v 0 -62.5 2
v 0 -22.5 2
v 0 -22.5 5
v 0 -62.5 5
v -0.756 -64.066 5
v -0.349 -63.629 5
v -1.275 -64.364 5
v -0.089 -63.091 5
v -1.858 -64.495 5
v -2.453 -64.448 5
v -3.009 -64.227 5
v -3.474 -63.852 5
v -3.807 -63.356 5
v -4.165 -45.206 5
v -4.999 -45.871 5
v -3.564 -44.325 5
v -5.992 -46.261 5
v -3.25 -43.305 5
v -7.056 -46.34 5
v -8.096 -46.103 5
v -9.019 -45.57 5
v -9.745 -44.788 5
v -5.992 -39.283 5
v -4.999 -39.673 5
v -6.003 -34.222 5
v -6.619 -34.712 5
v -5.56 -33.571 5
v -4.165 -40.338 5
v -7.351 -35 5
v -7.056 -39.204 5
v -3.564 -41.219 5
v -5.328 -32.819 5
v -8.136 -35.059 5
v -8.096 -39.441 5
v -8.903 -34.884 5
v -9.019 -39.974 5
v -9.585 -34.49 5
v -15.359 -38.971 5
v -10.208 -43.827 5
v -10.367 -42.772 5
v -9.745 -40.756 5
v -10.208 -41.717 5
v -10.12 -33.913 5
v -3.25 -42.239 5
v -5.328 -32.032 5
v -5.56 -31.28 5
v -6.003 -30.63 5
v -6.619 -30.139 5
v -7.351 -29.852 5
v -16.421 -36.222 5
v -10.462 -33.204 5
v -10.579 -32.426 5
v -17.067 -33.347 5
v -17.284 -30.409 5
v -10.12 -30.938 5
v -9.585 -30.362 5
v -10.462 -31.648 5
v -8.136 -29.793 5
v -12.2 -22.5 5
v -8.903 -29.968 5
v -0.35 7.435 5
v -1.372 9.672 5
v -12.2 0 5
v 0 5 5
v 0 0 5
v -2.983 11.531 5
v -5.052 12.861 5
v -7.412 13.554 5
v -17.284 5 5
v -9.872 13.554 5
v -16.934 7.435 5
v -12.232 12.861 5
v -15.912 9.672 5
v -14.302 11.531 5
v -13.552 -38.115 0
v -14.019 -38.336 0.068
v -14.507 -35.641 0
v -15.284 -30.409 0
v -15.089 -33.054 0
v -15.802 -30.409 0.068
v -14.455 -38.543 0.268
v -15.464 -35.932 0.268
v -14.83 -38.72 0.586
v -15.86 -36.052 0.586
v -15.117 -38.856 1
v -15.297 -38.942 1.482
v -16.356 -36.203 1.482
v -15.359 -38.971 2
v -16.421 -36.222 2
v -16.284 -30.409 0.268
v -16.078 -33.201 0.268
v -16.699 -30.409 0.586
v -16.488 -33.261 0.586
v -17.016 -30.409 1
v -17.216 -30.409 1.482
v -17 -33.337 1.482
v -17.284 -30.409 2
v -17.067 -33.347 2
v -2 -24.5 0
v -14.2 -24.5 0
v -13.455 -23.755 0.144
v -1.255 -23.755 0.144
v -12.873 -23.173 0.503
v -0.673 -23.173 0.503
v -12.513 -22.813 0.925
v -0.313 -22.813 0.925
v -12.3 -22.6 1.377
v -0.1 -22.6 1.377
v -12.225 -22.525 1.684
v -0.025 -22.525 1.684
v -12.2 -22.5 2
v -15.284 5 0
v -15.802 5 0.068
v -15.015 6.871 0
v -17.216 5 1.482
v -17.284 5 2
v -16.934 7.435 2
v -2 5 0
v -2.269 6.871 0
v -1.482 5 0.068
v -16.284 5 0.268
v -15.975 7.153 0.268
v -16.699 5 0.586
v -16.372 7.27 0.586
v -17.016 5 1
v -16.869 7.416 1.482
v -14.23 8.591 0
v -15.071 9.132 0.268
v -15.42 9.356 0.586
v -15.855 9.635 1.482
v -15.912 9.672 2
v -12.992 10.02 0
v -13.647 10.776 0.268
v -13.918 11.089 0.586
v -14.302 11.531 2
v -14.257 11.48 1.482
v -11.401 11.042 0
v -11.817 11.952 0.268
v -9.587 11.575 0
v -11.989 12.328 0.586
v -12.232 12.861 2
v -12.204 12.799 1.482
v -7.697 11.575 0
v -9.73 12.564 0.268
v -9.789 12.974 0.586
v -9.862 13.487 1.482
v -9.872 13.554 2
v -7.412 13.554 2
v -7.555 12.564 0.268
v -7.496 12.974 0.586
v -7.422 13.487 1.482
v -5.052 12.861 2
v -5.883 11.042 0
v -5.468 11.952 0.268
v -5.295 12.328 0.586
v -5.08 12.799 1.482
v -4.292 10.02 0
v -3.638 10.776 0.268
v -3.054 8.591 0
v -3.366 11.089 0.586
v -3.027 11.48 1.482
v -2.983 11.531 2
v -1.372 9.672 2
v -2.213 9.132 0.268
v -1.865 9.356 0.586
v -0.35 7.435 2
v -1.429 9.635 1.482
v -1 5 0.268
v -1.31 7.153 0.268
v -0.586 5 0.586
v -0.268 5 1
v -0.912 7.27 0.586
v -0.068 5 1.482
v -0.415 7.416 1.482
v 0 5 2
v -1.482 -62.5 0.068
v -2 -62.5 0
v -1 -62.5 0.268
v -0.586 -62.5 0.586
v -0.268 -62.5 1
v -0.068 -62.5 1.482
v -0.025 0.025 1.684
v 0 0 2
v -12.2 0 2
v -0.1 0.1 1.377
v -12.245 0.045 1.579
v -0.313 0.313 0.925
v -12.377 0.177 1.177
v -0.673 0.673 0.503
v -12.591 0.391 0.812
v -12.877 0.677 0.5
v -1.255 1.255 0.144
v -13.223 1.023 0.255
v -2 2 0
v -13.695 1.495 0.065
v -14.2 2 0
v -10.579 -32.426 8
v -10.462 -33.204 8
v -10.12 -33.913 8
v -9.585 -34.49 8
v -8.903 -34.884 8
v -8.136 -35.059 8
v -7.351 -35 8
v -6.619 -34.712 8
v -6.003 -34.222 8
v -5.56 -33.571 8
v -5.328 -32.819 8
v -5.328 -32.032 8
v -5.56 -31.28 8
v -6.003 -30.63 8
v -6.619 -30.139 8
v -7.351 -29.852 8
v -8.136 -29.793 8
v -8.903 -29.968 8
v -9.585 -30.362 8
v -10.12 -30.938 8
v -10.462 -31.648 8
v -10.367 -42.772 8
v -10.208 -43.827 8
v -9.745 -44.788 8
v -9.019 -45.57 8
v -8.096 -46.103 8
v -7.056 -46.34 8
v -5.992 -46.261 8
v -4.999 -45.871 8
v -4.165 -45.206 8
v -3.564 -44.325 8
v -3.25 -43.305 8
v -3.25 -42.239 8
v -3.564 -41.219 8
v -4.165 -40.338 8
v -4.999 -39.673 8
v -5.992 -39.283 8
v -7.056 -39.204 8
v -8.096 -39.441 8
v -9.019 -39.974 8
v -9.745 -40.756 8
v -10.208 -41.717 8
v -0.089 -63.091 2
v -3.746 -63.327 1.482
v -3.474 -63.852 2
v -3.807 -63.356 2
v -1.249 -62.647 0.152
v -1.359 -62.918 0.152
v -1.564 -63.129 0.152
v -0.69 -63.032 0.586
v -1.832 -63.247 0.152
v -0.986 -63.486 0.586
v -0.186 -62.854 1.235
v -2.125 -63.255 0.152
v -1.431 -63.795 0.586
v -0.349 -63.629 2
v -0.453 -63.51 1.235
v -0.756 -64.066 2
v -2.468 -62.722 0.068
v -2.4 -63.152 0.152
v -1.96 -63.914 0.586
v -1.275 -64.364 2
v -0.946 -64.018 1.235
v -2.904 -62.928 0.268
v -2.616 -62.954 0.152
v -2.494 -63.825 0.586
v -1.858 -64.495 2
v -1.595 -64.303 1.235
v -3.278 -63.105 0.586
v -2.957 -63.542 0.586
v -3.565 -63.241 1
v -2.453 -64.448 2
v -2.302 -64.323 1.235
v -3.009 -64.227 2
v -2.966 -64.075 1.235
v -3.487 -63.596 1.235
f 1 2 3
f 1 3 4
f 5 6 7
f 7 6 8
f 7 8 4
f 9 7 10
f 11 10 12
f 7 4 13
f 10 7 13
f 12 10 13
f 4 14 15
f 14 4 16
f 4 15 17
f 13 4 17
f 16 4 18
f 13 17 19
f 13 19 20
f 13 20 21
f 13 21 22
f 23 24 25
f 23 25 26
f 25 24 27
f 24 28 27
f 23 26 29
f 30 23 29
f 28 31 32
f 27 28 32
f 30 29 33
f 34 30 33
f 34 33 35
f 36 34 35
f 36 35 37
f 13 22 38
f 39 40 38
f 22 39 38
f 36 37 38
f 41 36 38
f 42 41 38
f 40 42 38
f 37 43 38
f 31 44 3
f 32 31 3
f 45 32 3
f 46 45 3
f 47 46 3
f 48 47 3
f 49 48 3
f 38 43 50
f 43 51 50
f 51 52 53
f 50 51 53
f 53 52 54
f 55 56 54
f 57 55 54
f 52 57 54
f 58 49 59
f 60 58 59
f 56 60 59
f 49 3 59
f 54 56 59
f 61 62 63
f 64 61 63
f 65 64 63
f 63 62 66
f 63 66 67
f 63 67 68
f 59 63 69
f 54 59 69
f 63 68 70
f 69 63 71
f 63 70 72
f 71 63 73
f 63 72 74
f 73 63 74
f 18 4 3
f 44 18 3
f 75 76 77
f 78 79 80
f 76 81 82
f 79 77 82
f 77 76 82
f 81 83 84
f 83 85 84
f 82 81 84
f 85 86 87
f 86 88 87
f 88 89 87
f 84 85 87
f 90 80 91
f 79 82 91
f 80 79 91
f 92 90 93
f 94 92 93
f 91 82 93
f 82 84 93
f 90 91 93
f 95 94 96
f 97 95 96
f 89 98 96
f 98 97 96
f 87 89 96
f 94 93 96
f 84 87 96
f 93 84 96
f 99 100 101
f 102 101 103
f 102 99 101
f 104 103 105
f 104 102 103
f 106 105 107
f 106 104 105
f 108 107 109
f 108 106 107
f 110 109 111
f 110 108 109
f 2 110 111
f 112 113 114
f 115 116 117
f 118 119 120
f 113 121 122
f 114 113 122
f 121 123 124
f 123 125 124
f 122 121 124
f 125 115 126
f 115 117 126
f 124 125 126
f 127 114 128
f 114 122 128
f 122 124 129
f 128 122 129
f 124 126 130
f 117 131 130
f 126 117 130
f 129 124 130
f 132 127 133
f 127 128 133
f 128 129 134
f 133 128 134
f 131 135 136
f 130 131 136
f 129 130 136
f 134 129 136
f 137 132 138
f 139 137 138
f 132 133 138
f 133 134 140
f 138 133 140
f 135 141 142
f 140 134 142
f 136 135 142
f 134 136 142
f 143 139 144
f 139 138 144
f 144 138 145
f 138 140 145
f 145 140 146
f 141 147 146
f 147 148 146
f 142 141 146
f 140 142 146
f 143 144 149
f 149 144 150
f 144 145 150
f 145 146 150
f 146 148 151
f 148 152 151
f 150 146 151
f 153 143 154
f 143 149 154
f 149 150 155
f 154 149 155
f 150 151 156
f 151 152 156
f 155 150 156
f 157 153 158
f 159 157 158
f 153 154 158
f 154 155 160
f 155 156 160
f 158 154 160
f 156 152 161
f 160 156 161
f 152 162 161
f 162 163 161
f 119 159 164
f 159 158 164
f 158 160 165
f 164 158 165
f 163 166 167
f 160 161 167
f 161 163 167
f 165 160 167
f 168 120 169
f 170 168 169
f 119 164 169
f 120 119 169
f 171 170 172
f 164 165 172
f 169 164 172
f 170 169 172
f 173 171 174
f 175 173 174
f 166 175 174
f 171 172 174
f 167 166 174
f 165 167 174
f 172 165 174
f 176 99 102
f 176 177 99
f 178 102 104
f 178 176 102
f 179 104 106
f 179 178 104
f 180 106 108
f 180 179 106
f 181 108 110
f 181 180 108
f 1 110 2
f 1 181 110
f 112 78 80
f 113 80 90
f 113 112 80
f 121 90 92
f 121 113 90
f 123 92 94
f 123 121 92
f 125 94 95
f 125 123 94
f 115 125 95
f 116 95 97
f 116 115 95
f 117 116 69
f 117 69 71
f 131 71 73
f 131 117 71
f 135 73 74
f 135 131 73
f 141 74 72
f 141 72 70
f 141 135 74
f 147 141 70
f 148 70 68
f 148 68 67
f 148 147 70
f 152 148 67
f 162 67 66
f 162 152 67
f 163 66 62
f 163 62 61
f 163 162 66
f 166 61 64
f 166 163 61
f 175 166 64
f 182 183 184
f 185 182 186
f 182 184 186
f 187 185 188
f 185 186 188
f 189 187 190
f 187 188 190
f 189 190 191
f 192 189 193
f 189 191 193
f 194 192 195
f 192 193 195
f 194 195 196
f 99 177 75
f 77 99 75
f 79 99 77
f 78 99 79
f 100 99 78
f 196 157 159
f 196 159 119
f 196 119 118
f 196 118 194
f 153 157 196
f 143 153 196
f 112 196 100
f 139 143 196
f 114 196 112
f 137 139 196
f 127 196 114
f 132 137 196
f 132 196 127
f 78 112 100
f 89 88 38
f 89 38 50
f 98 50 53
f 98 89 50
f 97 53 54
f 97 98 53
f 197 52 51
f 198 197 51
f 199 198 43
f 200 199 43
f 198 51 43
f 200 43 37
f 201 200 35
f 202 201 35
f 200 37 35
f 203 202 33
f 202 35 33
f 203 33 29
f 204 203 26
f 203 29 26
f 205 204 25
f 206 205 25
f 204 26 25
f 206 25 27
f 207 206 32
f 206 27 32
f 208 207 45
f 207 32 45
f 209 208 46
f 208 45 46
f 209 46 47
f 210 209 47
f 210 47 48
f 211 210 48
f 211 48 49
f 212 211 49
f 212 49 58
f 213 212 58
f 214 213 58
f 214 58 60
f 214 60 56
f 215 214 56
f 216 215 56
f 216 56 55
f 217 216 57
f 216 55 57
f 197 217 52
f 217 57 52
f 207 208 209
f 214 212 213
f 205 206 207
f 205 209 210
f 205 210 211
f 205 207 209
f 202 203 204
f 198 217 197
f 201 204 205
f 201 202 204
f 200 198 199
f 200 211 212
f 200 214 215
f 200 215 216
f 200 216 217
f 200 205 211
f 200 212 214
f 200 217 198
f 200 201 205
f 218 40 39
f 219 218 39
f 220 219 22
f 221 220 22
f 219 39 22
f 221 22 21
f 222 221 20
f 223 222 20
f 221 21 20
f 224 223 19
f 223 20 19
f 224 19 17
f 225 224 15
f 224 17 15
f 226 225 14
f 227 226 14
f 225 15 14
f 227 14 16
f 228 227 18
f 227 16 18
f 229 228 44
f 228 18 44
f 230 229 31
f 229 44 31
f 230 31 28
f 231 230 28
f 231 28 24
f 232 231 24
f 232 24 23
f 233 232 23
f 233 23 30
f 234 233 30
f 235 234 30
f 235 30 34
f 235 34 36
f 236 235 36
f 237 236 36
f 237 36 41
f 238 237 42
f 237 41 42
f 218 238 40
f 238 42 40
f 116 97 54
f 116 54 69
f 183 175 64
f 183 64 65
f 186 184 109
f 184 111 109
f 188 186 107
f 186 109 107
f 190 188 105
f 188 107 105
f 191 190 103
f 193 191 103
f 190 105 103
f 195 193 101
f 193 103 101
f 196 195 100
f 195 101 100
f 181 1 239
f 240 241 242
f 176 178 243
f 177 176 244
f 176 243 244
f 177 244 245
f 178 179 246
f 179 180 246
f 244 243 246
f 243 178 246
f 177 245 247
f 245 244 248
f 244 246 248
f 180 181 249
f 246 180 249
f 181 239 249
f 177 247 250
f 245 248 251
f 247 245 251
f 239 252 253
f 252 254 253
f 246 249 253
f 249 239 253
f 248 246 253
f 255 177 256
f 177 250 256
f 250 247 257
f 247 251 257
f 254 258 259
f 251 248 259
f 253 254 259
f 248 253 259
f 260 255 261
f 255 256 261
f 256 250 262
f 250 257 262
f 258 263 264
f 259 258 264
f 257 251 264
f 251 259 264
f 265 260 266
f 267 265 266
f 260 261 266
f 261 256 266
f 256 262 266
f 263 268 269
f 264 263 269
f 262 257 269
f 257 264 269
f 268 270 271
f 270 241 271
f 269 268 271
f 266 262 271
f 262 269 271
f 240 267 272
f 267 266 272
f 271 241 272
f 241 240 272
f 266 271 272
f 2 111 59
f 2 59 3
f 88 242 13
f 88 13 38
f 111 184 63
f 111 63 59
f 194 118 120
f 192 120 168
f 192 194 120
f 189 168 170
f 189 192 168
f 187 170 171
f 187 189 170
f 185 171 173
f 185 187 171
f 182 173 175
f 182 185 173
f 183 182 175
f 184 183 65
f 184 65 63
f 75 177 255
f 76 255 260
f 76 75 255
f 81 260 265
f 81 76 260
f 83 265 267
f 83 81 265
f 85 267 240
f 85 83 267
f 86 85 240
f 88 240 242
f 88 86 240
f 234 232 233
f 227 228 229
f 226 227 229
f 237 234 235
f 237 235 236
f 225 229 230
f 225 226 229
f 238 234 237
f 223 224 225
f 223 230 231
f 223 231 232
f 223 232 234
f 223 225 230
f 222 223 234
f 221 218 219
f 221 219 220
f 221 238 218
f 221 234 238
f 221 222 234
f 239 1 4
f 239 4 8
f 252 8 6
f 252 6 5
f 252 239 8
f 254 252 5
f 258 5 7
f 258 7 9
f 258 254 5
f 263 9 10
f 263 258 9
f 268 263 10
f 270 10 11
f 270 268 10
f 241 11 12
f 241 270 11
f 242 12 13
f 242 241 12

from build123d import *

# Parameters (mm, degrees)
EXTRUDE_1_DEPTH = 5
SKETCH_3_R      = 2.640227158
SKETCH_3_R_2    = 3.578323713
EXTRUDE_2_DEPTH = 3
FILLET_3_R      = 2


with BuildPart() as part:
    # 草圖1 → 填料-伸長1 (new body)
    with BuildSketch(Plane.XY):
        with BuildLine():
            Line((0, 0), (-12.2, 0))
            Line((-12.2, 0), (-12.2, -22.5))
            Line((-12.2, -22.5), (0, -22.5))
            Line((0, -22.5), (0, -62.5))
            ThreePointArc((0, -62.5), (-1.561204321, -64.451270958), (-3.807458352, -63.356209266))
            Line((-3.807458352, -63.356209266), (-15.358968834, -38.970962655))
            ThreePointArc((-15.358968834, -38.970962655), (-16.797094897, -34.796826792), (-17.284385317, -30.408869998))
            Line((-17.284385317, -30.408869998), (-17.284385317, 5))
            ThreePointArc((-17.284385317, 5), (-8.642192658, 13.642192658), (0, 5))
            Line((0, 5), (0, 0))
        make_face()
    extrude(amount=EXTRUDE_1_DEPTH)

    # 草圖3 → 填料-伸長2 (add)
    with BuildSketch(Plane.XY.offset(5)):
        with Locations(Location((-7.938901353, -32.425782639, 0), (0, 0, 180))):
            Circle(SKETCH_3_R)
        with Locations(Location((-6.788376637, -42.772023111, 0), (0, 0, 180))):
            Circle(SKETCH_3_R_2)
    extrude(amount=EXTRUDE_2_DEPTH)

    # 圓角3
    fillet_3_edges = [part.edges().sort_by_distance(p)[0] for p in [
        (-6.1, -22.5, 0),
        (0, -42.5, 0),
        (-1.561204321, -64.451270958, 0),
        (-9.583213593, -51.163585961, 0),
        (-16.797094897, -34.796826792, 0),
        (-17.284385317, -12.704434999, 0),
        (-8.642192658, 13.642192658, 0),
        (0, 2.5, 0),
        (-6.1, 0, 0),
        (-12.2, -11.25, 0),
    ]]
    fillet(fillet_3_edges, radius=FILLET_3_R)


solid = part.part
